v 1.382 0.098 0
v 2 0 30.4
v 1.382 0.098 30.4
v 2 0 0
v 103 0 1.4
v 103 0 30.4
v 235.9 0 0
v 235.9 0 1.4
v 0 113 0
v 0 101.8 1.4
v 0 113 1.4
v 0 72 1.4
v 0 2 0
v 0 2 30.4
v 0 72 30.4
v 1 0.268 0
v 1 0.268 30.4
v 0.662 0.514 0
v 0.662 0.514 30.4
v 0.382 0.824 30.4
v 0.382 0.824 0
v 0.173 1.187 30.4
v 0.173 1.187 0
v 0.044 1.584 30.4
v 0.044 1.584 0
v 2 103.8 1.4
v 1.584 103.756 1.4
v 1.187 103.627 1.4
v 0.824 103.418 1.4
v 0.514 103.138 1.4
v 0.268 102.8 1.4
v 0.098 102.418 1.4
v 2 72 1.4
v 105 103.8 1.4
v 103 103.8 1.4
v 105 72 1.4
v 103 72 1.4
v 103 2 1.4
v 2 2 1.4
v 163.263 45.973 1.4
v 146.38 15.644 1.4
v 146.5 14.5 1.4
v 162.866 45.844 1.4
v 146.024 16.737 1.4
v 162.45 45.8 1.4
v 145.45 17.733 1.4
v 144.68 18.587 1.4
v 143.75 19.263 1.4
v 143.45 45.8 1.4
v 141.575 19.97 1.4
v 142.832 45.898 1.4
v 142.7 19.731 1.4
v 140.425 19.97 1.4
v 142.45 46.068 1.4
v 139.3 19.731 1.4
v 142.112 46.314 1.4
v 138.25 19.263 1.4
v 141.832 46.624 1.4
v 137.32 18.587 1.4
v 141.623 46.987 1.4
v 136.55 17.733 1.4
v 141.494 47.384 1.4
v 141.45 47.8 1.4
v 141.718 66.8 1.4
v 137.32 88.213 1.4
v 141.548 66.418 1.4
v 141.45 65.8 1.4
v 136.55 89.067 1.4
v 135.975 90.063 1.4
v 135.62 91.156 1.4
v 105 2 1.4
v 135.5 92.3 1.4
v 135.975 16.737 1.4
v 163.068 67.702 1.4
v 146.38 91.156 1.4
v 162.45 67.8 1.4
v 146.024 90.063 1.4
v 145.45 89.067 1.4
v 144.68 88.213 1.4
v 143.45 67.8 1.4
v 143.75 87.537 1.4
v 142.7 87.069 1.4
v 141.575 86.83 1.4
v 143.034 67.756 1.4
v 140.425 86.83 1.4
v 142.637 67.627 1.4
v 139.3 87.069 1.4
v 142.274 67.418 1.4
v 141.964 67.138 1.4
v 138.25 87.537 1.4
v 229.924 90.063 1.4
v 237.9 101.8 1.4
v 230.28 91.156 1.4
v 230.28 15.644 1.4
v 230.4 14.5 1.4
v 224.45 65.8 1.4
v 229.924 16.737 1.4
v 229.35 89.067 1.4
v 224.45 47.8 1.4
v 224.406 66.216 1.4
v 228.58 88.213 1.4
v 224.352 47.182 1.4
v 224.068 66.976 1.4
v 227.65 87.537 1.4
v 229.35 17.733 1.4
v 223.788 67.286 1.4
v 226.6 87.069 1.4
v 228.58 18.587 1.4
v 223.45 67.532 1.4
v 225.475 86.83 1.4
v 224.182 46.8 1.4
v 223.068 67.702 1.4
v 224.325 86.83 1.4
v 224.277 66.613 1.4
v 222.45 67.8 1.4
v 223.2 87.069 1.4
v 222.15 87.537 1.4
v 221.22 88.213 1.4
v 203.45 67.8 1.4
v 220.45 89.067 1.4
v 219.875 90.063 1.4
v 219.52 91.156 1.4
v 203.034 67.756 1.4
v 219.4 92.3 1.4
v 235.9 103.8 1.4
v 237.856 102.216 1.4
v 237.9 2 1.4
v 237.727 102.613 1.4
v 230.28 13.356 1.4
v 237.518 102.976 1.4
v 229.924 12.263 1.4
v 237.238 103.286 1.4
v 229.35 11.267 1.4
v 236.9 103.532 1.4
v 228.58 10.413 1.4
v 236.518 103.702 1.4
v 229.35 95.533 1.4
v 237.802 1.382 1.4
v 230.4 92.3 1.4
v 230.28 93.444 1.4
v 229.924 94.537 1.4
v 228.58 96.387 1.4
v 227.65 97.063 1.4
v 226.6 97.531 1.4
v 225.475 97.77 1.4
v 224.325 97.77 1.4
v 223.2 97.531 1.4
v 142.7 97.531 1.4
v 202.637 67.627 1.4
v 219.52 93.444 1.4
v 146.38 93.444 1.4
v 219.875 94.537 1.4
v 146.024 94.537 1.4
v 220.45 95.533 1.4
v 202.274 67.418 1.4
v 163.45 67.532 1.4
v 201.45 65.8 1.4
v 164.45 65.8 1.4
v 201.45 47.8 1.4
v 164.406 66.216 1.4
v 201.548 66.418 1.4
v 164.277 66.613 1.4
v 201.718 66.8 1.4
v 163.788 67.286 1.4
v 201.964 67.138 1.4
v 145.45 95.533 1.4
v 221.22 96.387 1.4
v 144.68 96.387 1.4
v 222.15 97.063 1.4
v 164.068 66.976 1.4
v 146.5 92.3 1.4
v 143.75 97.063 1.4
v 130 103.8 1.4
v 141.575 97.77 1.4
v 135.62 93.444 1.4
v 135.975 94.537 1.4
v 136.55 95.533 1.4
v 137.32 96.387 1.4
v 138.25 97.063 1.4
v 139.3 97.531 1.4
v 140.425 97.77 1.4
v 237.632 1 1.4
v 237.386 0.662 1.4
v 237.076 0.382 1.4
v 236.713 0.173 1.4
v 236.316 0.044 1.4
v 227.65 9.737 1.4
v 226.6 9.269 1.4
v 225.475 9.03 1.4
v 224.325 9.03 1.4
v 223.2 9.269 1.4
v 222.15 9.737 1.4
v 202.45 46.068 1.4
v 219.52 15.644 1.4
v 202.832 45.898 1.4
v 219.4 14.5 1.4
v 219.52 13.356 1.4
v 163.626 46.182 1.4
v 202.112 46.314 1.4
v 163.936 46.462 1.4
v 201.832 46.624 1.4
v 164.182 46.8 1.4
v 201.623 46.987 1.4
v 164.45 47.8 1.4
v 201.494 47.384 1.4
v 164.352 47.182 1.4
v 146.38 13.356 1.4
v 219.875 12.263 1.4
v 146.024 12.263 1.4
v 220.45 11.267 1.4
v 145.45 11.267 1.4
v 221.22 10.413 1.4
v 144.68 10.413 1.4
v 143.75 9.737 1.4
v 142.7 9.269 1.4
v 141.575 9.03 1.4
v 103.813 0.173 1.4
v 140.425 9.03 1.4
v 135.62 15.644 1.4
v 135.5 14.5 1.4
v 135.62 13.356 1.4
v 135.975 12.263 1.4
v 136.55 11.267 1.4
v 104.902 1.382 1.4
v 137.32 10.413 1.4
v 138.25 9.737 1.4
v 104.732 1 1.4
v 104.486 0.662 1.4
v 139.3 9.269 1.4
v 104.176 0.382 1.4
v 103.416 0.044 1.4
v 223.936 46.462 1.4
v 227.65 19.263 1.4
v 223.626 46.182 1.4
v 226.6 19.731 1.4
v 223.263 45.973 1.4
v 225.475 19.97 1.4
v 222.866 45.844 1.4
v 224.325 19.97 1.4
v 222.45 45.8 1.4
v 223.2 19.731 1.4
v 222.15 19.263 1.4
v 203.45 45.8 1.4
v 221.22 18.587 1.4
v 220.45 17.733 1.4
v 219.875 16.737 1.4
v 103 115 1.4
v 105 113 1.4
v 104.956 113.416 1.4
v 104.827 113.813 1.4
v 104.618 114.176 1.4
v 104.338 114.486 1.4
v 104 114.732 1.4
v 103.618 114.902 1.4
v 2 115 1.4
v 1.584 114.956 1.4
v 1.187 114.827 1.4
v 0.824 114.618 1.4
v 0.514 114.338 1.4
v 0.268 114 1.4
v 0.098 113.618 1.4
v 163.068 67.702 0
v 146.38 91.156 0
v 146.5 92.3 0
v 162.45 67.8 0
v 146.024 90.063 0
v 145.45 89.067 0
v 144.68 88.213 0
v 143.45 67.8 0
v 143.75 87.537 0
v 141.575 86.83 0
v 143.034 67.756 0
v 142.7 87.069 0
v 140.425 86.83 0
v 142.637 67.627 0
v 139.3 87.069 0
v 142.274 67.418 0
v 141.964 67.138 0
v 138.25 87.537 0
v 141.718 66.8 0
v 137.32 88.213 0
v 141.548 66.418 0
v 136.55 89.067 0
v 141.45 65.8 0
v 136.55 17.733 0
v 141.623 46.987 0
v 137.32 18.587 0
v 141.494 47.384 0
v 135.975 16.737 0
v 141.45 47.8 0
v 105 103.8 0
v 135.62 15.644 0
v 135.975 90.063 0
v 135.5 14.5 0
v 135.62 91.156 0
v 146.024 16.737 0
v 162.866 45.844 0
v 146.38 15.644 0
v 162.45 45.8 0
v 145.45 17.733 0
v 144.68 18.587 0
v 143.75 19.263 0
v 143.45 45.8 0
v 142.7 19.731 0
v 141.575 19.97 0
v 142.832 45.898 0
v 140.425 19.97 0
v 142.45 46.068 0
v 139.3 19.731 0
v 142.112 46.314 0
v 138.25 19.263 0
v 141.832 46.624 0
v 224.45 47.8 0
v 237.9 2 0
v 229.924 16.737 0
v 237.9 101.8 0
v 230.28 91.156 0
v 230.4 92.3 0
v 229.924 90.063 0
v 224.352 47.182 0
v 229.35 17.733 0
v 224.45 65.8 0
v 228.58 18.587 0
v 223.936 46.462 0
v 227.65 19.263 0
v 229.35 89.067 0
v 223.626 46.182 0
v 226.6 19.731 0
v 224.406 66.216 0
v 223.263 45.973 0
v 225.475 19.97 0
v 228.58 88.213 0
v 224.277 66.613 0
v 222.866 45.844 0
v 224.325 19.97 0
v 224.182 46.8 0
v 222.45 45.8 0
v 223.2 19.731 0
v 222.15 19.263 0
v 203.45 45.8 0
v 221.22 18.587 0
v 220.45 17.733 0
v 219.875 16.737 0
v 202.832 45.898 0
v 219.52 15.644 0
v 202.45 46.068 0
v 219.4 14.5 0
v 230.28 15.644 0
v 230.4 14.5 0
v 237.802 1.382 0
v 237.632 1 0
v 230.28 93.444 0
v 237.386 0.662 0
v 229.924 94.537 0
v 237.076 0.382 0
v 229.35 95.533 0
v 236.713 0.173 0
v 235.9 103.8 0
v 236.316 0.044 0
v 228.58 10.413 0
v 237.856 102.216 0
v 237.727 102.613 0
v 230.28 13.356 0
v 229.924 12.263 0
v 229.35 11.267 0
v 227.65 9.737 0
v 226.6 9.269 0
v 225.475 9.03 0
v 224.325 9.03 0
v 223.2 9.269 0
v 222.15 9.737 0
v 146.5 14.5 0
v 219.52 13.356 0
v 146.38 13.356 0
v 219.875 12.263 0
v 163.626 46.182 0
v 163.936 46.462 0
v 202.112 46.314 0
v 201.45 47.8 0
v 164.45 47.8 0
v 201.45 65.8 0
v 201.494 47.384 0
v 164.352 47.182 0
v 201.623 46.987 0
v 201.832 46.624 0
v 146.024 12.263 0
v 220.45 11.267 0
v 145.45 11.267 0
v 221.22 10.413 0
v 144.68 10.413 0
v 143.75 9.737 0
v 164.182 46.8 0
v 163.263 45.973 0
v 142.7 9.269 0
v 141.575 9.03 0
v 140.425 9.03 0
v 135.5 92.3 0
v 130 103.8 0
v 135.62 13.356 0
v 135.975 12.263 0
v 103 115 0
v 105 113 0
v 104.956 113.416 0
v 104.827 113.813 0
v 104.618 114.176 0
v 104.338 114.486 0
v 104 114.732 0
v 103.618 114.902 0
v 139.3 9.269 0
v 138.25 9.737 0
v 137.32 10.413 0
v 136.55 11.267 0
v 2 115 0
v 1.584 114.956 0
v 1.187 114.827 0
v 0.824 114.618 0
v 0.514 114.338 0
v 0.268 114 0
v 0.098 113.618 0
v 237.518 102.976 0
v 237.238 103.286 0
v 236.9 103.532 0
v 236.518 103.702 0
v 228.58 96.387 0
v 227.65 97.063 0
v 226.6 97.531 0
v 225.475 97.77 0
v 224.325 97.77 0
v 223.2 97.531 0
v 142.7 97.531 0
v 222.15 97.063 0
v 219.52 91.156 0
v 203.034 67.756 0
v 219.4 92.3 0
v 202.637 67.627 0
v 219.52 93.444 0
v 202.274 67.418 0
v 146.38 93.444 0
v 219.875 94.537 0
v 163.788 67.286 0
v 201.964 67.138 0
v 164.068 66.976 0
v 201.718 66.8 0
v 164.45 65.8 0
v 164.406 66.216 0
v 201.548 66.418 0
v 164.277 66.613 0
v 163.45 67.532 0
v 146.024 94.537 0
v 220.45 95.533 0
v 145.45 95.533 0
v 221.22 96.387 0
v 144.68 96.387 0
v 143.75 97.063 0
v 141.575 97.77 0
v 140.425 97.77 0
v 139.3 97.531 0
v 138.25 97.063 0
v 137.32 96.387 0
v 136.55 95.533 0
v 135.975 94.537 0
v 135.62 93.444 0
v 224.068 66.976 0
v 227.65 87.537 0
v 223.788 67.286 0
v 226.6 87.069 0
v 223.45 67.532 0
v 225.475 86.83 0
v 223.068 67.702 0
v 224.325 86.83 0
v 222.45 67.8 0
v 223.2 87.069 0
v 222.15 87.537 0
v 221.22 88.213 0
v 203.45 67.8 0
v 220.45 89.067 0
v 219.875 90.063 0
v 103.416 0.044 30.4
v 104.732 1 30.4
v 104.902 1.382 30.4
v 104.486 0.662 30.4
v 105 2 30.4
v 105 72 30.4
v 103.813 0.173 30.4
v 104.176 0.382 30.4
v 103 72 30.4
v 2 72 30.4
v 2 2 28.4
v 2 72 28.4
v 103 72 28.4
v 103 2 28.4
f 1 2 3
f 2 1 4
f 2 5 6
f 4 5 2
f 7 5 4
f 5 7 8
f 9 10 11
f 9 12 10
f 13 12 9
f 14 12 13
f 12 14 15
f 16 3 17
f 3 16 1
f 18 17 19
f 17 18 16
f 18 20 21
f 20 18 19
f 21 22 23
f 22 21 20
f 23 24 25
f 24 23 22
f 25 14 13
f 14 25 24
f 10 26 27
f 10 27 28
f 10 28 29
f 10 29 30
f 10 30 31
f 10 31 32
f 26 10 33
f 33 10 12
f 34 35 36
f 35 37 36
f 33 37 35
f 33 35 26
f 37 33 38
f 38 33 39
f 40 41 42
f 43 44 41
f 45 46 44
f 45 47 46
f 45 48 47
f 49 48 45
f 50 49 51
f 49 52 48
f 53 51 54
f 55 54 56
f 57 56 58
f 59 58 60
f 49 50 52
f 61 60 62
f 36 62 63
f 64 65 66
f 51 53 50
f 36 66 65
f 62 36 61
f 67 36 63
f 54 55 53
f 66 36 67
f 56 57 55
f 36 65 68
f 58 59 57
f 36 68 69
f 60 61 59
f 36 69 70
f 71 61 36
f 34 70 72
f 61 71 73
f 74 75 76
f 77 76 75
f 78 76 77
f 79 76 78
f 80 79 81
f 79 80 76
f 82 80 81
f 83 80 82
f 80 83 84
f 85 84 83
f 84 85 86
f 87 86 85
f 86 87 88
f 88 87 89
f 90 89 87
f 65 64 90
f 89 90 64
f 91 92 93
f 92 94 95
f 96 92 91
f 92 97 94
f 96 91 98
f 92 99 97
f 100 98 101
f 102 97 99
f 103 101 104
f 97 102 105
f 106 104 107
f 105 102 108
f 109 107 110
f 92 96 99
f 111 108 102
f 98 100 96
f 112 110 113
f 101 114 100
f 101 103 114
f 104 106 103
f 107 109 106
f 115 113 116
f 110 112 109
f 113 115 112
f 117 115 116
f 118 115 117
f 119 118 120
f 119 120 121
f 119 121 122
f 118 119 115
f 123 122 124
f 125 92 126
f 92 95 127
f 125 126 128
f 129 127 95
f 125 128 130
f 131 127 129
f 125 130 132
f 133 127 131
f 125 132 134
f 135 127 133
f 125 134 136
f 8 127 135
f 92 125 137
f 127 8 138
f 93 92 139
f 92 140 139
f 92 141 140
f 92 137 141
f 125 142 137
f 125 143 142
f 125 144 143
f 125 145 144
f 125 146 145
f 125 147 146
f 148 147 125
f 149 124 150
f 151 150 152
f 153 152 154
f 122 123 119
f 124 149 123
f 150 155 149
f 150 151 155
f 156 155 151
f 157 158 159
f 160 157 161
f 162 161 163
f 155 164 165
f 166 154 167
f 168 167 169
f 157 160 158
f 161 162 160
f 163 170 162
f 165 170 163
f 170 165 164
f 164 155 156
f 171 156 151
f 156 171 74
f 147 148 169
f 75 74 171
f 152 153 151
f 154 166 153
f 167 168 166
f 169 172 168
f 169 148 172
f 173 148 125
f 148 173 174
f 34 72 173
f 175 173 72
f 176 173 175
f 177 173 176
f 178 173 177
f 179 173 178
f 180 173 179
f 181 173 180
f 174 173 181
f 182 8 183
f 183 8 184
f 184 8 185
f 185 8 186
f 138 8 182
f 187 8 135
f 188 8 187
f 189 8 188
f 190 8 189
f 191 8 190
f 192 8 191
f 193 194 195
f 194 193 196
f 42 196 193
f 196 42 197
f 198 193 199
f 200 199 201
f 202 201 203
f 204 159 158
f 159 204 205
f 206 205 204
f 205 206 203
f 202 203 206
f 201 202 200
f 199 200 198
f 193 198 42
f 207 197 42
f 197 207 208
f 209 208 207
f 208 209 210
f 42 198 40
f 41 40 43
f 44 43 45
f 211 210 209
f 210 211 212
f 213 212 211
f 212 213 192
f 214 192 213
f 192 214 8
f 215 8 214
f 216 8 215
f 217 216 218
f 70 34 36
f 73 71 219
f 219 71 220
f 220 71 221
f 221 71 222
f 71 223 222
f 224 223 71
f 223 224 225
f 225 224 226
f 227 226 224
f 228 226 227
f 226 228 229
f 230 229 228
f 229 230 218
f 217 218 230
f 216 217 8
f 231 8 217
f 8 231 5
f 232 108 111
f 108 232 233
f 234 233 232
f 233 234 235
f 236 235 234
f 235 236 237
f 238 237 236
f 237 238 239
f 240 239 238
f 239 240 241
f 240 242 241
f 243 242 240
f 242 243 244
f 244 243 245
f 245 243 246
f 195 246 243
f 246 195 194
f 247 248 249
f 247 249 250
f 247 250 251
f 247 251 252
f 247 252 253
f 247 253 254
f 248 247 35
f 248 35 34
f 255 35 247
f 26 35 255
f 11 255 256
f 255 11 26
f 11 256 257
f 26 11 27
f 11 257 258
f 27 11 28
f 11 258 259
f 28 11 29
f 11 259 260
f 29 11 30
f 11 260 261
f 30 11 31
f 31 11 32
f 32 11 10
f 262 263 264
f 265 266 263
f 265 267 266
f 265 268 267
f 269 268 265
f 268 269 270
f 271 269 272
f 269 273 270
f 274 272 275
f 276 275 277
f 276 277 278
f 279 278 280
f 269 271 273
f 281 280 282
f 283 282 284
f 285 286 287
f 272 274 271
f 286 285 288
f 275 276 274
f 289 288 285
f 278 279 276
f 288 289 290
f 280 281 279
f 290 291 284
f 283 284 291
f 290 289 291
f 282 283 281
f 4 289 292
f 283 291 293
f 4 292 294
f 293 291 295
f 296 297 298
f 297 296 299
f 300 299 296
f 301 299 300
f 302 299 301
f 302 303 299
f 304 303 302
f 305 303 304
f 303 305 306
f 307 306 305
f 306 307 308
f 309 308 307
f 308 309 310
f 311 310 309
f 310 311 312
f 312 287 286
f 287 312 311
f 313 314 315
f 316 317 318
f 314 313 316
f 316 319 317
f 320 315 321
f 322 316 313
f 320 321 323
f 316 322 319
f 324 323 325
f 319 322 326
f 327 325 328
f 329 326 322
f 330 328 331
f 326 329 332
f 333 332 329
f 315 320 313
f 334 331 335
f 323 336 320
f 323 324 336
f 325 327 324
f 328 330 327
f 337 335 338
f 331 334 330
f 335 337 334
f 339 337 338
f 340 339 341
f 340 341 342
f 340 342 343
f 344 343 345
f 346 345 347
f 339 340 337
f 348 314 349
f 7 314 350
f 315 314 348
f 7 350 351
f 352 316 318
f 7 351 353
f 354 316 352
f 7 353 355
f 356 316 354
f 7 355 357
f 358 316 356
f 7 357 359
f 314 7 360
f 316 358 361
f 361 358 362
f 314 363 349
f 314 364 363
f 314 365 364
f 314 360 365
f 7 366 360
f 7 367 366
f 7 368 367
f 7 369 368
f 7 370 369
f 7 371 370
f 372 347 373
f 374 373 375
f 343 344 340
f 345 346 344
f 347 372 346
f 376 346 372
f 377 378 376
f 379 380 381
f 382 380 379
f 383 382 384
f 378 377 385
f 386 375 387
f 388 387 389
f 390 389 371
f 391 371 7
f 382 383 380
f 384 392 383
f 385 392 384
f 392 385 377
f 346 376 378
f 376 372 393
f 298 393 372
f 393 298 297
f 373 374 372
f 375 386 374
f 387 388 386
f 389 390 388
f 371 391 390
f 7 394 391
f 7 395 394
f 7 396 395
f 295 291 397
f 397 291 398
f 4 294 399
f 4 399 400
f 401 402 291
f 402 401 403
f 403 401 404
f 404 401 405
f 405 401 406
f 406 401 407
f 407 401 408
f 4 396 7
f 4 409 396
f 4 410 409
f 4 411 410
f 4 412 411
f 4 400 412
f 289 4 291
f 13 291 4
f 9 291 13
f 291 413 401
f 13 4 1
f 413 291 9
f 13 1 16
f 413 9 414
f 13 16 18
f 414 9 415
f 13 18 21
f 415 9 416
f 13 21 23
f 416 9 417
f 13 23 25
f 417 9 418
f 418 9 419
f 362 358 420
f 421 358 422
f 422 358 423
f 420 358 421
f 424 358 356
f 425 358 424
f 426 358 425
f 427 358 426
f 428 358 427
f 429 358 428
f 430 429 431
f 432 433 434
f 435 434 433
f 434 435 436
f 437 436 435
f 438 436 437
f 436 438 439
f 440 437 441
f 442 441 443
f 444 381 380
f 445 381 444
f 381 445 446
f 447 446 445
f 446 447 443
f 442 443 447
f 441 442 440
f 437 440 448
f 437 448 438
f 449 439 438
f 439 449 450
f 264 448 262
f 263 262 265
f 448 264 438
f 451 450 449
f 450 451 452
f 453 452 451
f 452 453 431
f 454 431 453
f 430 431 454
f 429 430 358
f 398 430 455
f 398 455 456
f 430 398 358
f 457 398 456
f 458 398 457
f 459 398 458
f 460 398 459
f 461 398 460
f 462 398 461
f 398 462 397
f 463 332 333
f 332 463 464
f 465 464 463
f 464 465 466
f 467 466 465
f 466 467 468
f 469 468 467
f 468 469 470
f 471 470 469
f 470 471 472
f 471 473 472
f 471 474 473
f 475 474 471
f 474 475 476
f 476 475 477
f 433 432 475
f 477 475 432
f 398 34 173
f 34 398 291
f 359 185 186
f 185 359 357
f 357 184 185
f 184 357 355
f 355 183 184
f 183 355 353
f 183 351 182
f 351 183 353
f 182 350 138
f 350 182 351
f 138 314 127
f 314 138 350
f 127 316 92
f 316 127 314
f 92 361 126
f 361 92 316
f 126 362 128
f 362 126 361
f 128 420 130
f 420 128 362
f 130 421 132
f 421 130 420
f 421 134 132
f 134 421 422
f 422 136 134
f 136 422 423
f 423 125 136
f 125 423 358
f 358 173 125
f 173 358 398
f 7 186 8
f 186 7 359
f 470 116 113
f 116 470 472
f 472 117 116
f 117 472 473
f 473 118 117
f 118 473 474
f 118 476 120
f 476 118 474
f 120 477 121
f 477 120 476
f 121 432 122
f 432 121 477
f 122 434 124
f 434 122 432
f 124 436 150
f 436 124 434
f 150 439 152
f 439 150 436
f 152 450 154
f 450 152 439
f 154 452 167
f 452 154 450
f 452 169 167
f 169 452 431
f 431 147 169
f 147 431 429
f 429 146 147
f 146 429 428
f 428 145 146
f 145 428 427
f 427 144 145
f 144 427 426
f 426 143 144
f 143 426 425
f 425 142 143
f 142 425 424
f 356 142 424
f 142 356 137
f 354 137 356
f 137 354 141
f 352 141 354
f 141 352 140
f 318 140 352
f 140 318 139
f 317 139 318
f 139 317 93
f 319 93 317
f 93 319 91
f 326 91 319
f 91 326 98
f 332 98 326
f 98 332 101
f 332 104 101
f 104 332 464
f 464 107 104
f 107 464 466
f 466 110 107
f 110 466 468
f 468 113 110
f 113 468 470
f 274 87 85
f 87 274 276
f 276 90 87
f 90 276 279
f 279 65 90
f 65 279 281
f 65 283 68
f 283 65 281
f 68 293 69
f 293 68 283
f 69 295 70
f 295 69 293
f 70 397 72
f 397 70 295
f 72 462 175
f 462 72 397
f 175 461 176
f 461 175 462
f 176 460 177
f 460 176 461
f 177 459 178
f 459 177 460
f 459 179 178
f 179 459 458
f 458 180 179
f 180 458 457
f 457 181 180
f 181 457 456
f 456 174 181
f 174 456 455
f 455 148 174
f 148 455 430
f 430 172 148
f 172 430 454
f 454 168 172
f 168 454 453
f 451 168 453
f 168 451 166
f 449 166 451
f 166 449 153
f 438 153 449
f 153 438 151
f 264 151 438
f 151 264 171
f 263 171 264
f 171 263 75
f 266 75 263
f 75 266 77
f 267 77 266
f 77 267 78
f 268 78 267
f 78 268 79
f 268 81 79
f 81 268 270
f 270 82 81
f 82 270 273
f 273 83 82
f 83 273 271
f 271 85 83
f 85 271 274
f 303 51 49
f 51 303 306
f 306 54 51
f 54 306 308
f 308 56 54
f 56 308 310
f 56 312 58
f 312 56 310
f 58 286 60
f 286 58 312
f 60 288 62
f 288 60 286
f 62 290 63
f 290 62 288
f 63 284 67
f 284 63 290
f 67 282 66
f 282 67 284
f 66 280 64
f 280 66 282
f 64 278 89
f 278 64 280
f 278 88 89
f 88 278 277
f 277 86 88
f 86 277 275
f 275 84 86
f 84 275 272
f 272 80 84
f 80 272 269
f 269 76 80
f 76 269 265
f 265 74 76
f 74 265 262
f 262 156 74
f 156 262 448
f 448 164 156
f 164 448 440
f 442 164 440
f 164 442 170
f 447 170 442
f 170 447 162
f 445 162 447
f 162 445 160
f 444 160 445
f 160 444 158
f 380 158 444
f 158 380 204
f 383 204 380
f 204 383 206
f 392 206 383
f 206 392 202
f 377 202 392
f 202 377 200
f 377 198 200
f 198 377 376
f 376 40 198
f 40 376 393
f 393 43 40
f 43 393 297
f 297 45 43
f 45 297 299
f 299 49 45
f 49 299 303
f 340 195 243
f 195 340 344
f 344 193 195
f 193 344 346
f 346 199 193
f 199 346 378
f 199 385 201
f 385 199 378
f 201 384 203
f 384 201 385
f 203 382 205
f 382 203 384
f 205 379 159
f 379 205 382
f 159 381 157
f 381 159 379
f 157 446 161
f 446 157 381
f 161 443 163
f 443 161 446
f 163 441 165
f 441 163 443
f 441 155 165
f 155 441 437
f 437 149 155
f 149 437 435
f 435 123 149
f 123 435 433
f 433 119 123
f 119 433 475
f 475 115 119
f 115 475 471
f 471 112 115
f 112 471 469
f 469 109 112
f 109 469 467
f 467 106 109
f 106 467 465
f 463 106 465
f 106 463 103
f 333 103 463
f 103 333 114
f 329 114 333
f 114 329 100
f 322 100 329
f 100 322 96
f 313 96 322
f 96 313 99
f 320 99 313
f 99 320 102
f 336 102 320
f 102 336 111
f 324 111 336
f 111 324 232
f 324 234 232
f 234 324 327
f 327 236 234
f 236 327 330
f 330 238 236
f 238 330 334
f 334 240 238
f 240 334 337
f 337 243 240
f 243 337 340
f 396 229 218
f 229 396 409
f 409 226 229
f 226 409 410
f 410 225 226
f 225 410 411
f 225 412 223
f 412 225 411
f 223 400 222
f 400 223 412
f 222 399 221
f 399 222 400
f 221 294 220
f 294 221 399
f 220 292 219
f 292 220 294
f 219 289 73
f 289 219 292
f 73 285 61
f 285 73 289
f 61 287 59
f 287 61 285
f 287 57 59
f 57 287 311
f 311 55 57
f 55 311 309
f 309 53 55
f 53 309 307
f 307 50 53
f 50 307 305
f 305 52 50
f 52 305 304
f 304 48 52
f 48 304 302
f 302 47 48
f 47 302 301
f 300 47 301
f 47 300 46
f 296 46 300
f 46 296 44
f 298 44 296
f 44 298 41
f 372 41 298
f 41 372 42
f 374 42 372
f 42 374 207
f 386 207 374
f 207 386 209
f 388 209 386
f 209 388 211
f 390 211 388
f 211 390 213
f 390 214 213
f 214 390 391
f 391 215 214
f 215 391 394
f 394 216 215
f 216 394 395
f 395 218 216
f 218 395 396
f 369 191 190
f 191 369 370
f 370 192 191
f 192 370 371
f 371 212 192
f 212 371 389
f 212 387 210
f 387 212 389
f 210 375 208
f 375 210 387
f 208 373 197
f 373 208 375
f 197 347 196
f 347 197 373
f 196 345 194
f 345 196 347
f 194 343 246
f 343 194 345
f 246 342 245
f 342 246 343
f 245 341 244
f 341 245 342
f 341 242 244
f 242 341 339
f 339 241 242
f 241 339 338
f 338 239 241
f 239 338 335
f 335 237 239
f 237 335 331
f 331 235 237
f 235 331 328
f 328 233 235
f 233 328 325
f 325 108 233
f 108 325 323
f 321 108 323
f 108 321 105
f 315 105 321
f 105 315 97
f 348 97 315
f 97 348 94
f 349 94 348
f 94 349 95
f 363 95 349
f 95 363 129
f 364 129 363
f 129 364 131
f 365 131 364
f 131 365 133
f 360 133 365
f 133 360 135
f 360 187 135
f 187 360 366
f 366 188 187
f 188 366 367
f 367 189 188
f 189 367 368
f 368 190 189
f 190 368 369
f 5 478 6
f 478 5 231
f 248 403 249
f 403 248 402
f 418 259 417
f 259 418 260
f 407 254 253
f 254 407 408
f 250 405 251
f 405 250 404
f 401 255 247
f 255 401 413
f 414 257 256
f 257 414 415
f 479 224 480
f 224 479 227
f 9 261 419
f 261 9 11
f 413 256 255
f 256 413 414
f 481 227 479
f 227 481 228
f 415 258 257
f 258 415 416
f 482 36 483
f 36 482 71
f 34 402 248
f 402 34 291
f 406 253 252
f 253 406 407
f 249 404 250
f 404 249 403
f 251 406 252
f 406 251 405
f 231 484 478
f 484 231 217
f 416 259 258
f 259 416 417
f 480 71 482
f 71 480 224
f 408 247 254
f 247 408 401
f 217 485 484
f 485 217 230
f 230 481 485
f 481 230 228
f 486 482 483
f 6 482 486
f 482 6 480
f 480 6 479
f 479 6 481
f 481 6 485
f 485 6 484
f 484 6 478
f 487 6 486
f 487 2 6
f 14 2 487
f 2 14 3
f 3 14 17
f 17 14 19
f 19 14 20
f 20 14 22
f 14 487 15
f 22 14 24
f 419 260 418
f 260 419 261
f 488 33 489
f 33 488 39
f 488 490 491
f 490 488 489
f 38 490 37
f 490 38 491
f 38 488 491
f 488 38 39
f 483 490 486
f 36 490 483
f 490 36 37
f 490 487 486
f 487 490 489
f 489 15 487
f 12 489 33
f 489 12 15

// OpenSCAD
$fn = 30;

base_depth = 1.4;
wall_thickness = 2;
margin_top = 5;

ont_width = 109.9;
ont_height = 108.8 - margin_top;

ont_screw_mount = 60;
ont_screw_width = 23;
ont_screw_height = 22;
ont_screw_pos_y = 52 - margin_top;
ont_screw_round = 2;

ont_feet_d = 11;
ont_feet_margin_t = 11 - margin_top;
ont_feet_margin_b = 9;
ont_feet_margin_lr = 7.5;

ups_width = 99;
ups_depth = 109;
ups_height = 25;
ups_padding = 2;

ups_tray_height = 70;

gap = 25;
offset = 0;

module ont_base() {
	difference() {
		linear_extrude(base_depth)
		difference() {
			// base
			offset(wall_thickness) offset(-wall_thickness)
			square([ont_width, ont_height]);
			
			// feet
			translate([ont_feet_margin_lr + ont_feet_d / 2, ont_feet_margin_b + ont_feet_d / 2])
			circle(d = ont_feet_d);

			translate([ont_width - ont_feet_margin_lr - ont_feet_d / 2, ont_feet_margin_b + ont_feet_d / 2])
			circle(d = ont_feet_d);

			translate([ont_width - ont_feet_margin_lr - ont_feet_d / 2, ont_height - ont_feet_margin_t - ont_feet_d / 2])
			circle(d = ont_feet_d);
			
			translate([ont_feet_margin_lr + ont_feet_d / 2, ont_height - ont_feet_margin_t - ont_feet_d / 2])
			circle(d = ont_feet_d);
			
			// screw holes
			offset(ont_screw_round) offset(-ont_screw_round)
			translate([ont_width / 2 - ont_screw_width / 2 - ont_screw_mount / 2, ont_height - (ont_screw_pos_y + ont_screw_height / 2)])
			square([ont_screw_width, ont_screw_height]);

			offset(ont_screw_round) offset(-ont_screw_round)
			translate([ont_width / 2 - ont_screw_width / 2 + ont_screw_mount / 2, ont_height - (ont_screw_pos_y + ont_screw_height / 2)])
			square([ont_screw_width, ont_screw_height]);
		};
	};
}

module ups_base() {
	difference() {
		// container
		linear_extrude(base_depth + ups_height +  ups_padding + wall_thickness)
		offset(wall_thickness) offset(-wall_thickness)
		square([ups_width + 2 * wall_thickness + ups_padding, ups_depth + 2 * 
	wall_thickness + ups_padding]);

		// cut ups out
		translate([0, 0, base_depth])
		linear_extrude(ups_height + ups_padding)
		translate([wall_thickness, wall_thickness])
		square([ups_width + ups_padding, ups_depth + ups_padding]);
		
		// cut top off
		translate([-1, wall_thickness + ups_tray_height, base_depth])
		linear_extrude(ups_height + ups_padding + wall_thickness + 1)
		square([ups_width + ups_padding + 2 * wall_thickness + 2, ups_depth - ups_tray_height + ups_padding + 2 * wall_thickness + 1]);
	}

	// tray
	translate([0, 0, base_depth + ups_height + ups_padding])
	linear_extrude(wall_thickness)
	offset(wall_thickness) offset(-wall_thickness)
	square([wall_thickness + ups_width + ups_padding + wall_thickness, wall_thickness + ups_tray_height]);
}

module connector() {
	linear_extrude(base_depth)
	offset(wall_thickness) offset(-wall_thickness)
	square([ups_width + ups_padding + 2 * wall_thickness, ont_height]);

	linear_extrude(base_depth)
	translate([ups_width + ups_padding + wall_thickness, 0])
	square([gap + wall_thickness, ont_height]);

}

translate([ups_width + ups_padding + wall_thickness, offset, 0]) {
	translate([gap, 0, 0]) ont_base();

	translate([- ups_width - ups_padding - wall_thickness, 0, 0])
	connector();
}
ups_base();
